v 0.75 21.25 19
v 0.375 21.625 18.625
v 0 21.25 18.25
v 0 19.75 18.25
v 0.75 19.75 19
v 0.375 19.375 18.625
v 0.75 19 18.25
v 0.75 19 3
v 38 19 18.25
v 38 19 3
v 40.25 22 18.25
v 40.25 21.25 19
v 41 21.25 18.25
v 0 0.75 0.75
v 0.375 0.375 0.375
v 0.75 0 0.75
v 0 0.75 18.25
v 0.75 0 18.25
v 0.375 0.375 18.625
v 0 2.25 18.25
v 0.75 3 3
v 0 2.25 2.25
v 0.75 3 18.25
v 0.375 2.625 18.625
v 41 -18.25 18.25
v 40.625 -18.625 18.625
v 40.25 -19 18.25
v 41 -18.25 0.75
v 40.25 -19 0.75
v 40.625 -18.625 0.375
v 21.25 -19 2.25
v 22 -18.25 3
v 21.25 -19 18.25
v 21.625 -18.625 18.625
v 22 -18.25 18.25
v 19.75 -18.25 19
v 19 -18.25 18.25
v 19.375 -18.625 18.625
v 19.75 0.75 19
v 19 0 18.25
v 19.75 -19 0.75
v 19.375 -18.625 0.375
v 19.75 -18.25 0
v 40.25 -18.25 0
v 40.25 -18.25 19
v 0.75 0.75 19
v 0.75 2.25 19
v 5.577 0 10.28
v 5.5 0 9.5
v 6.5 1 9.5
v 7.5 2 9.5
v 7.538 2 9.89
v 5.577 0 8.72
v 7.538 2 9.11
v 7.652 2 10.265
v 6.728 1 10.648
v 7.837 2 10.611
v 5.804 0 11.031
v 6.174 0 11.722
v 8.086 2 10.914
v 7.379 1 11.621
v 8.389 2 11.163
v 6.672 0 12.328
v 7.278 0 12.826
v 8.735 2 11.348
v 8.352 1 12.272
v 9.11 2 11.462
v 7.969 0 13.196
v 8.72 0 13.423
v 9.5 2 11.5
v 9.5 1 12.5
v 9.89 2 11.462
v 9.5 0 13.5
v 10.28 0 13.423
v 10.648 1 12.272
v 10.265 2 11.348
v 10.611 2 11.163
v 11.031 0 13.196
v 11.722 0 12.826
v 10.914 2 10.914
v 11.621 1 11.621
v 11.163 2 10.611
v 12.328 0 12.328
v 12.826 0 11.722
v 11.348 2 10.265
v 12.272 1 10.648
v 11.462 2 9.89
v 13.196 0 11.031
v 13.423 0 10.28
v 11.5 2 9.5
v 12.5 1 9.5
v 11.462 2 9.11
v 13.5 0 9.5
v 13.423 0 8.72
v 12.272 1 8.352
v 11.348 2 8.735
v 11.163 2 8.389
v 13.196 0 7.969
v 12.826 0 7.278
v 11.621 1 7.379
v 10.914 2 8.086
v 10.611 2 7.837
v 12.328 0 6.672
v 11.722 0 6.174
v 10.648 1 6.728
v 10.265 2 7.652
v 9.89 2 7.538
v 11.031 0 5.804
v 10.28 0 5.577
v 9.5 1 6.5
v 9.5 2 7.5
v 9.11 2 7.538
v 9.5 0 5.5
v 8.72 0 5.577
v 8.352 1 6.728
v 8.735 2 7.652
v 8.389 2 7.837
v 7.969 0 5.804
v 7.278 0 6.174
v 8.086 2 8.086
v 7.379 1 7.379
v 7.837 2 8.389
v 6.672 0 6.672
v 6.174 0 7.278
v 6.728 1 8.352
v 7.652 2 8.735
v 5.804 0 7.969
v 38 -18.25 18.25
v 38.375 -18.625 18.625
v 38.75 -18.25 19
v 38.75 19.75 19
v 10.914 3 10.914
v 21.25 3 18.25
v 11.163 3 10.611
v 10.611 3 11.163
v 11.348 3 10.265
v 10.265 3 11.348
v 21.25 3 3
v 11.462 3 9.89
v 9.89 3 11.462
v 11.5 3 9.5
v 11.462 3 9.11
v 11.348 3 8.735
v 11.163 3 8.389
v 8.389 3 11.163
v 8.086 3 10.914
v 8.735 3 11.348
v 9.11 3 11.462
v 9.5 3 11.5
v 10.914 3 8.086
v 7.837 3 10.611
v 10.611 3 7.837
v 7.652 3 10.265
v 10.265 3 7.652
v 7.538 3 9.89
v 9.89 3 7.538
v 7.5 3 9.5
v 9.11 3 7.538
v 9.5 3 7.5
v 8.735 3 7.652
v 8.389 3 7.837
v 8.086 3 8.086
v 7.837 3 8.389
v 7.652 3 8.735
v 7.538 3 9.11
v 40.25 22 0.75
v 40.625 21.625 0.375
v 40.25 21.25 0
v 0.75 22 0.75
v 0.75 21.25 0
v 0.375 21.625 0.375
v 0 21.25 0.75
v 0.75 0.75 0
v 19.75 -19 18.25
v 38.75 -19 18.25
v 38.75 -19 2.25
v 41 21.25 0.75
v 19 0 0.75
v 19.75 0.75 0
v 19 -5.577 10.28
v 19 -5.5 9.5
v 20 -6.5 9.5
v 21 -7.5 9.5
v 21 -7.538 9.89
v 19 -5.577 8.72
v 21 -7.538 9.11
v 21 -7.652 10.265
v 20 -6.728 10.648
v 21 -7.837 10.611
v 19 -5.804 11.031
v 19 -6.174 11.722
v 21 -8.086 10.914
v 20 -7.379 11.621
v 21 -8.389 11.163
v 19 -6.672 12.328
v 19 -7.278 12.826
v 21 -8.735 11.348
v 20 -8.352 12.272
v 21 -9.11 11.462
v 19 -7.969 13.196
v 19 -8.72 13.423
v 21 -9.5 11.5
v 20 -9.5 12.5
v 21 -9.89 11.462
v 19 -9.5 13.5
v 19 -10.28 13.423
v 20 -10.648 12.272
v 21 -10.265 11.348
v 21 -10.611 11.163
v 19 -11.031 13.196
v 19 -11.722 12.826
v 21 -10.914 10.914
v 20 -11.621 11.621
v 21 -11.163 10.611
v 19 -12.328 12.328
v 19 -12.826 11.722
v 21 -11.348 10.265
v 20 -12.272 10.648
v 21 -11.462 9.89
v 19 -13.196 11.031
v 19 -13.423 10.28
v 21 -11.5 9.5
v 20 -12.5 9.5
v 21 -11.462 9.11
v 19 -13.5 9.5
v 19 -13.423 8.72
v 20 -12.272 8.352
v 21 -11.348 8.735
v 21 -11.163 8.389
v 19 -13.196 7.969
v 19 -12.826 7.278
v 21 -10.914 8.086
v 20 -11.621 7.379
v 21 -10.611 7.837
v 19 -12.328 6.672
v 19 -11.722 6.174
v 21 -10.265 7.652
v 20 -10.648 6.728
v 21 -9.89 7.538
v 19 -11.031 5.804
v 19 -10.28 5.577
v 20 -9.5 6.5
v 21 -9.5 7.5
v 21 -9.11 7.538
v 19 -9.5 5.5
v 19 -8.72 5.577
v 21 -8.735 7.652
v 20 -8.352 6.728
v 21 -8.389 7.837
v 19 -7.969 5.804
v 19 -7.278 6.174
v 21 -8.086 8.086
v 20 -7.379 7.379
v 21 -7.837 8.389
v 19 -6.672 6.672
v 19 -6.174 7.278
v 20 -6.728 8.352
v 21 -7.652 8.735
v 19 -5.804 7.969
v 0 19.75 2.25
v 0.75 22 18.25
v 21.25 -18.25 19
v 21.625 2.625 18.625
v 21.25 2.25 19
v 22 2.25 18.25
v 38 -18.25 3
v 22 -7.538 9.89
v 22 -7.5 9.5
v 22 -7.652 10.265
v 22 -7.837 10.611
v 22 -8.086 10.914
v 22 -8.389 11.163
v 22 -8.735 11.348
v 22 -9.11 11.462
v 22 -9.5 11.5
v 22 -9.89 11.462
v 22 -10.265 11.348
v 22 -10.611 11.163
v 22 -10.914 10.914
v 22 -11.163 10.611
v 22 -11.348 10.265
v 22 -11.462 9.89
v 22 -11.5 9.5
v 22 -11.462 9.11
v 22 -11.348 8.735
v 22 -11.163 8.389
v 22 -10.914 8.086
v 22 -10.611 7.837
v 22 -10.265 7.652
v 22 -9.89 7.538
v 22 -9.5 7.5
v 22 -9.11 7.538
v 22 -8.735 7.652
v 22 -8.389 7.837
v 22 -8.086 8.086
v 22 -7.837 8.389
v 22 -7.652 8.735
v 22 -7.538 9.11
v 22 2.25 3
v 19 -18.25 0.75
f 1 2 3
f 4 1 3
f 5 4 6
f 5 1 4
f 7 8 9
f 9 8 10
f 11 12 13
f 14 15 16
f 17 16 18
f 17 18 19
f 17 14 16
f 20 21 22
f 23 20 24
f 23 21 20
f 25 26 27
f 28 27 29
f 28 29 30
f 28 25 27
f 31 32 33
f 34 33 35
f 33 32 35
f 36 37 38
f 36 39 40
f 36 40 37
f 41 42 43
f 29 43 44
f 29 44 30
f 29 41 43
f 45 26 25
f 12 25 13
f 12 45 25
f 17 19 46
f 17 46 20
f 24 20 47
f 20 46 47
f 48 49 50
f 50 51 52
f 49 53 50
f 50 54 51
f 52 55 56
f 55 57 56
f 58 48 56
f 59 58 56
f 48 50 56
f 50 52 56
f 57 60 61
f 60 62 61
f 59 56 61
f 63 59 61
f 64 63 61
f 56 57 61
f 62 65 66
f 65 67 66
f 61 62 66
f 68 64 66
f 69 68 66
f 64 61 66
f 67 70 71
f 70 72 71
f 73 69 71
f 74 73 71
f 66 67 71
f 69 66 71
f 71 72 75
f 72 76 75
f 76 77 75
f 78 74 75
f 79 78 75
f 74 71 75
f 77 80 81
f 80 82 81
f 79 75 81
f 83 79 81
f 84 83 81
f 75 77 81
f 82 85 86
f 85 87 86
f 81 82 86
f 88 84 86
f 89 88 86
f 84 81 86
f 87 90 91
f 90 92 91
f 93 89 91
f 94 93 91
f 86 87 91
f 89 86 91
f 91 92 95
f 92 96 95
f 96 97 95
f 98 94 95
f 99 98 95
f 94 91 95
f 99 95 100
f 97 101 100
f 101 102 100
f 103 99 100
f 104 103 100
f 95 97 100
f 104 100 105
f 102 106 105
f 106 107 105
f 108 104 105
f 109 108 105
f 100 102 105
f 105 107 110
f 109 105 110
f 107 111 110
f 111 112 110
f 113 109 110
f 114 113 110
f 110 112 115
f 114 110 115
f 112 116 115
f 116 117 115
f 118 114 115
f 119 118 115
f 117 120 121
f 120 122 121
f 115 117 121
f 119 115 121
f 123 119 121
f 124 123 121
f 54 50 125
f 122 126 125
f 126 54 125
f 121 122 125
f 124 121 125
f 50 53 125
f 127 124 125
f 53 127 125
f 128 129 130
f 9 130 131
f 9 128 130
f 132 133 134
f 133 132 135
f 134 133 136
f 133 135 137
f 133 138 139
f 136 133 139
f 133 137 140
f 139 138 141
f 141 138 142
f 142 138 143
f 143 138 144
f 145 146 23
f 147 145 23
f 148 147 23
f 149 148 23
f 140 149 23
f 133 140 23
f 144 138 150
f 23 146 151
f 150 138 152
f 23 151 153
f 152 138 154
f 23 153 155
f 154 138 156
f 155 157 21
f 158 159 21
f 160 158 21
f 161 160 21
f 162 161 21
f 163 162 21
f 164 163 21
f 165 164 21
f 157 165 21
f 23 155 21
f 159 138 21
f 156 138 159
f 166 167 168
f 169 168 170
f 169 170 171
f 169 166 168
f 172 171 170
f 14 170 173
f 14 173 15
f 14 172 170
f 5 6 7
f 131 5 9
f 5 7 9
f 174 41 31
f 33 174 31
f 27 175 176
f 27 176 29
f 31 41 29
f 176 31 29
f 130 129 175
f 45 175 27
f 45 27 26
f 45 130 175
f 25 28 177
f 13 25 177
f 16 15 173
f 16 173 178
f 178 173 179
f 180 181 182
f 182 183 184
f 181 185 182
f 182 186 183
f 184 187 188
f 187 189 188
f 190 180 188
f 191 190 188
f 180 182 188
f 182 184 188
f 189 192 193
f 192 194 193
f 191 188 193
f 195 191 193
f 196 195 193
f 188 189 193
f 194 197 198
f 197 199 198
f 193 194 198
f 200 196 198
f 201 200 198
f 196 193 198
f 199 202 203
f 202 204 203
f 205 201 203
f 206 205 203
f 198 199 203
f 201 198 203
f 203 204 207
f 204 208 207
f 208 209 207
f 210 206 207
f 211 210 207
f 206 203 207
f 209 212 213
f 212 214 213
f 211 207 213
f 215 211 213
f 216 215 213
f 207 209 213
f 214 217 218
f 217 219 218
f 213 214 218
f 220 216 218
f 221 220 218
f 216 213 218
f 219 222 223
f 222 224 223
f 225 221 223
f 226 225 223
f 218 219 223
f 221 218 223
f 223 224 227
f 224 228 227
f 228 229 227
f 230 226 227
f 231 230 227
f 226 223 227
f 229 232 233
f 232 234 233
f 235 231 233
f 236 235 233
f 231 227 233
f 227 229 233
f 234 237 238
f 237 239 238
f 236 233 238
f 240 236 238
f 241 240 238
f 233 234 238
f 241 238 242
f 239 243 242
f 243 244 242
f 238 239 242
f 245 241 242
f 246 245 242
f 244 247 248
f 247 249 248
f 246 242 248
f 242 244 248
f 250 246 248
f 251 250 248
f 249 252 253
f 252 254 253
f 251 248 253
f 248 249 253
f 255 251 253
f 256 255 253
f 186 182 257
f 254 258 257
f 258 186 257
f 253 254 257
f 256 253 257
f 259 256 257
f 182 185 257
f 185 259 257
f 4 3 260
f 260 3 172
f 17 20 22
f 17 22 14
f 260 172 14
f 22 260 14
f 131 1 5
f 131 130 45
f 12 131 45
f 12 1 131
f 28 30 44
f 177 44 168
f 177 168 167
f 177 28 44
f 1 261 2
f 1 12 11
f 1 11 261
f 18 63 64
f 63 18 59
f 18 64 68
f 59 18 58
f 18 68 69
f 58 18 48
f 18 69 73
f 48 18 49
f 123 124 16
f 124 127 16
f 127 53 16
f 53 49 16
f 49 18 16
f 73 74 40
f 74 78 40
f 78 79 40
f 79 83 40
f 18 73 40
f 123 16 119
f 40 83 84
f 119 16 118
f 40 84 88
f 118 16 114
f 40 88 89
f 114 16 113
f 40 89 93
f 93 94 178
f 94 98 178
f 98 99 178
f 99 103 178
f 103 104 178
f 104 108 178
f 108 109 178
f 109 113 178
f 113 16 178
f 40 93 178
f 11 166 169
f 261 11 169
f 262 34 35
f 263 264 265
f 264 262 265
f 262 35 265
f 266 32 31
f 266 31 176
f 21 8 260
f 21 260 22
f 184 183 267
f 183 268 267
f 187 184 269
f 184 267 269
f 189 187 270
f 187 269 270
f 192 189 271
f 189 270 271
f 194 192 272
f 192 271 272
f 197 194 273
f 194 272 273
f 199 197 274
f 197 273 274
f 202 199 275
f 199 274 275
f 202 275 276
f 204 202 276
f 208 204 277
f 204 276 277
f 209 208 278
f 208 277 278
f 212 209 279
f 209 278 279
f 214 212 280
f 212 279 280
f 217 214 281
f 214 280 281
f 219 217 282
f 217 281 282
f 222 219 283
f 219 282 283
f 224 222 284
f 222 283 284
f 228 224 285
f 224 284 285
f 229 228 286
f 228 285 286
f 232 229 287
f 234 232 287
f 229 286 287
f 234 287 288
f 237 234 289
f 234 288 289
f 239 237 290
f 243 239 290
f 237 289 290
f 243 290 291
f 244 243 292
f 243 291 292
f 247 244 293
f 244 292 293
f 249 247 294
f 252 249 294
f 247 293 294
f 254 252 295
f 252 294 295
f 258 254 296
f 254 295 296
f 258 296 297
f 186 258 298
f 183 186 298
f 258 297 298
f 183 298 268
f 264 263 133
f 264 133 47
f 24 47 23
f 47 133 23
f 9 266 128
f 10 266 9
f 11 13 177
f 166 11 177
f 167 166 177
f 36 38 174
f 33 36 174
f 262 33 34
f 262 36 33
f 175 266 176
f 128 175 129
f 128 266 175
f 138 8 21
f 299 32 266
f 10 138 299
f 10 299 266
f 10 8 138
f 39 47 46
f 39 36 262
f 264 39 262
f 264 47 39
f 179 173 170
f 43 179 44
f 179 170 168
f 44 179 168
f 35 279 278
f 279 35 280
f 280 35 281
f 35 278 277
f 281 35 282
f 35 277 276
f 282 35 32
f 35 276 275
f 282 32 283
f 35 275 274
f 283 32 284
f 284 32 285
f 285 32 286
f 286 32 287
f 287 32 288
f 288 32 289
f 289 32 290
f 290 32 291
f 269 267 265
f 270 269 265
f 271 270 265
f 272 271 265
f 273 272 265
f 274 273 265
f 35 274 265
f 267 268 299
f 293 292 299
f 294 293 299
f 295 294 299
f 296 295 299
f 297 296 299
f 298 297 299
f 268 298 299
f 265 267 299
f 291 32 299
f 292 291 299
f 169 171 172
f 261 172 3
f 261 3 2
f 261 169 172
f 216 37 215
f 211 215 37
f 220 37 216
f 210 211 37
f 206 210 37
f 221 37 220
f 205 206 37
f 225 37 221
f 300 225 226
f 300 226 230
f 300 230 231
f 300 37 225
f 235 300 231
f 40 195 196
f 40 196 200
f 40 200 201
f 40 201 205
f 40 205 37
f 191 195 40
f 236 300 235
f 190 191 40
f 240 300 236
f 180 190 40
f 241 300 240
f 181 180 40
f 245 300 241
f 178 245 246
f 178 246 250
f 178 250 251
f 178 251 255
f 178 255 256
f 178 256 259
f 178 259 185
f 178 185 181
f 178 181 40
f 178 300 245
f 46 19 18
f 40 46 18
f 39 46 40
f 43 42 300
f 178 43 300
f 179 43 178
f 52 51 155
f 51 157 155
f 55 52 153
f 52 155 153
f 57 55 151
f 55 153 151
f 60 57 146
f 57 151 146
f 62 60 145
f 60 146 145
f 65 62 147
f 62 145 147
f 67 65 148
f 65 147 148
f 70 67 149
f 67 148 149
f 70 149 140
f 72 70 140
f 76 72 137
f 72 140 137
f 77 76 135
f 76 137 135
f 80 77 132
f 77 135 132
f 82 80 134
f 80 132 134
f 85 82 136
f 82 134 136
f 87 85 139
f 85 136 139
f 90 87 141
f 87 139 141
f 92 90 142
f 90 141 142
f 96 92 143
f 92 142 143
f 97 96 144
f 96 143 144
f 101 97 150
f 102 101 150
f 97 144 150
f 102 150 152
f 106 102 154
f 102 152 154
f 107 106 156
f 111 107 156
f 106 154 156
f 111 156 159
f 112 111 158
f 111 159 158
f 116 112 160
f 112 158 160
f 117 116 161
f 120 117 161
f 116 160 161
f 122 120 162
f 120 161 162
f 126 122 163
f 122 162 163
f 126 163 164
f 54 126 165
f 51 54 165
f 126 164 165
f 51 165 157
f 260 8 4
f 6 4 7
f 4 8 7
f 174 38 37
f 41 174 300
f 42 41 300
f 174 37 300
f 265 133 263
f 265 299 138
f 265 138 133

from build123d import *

# Parameters (mm, degrees)
F0_W           = 22
F0_H           = 19
F1_DEPTH       = 3
F2_W           = 3
F2_H           = 38
F2_W_2         = 19
F2_H_2         = 3
F3_DEPTH       = 16
F5_D           = 4
F5_DEPTH       = 12
F5_CSINK_D     = 8
F5_CSINK_ANGLE = 90
F5_TIP         = 1.2017212381
F7_D           = 4
F7_DEPTH       = 12
F7_CSINK_D     = 8
F7_CSINK_ANGLE = 90
F7_TIP         = 1.2017212381
F8_SIZE        = 0.75
F9_SIZE        = 0.75
F10_SIZE       = 0.75
F11_SIZE       = 0.75
F12_SIZE       = 0.75


with BuildPart() as f1:
    # F0 (on Top) → F1 (new body)
    with BuildSketch(Plane.XY):
        Polygon((0, 22), (0, 0), (19, 0), (41, 0), (41, 22), align=None)
        with Locations((30, -9.5)):
            Rectangle(F0_W, F0_H)
    extrude(amount=F1_DEPTH)

    # F2 (on face) → F3 (join)
    with BuildSketch(Plane.XY.offset(3)):
        Polygon((41, 22), (0, 22), (0, 19), (38, 19), (41, 19), align=None)
        with Locations((39.5, 0)):
            Rectangle(F2_W, F2_H)
        Polygon((22, 3), (19, 3), (19, 0), (19, -19), (22, -19), align=None)
        with Locations((9.5, 1.5)):
            Rectangle(F2_W_2, F2_H_2)
    extrude(amount=F3_DEPTH)

    # F5
    with Locations(Plane.XZ):
        with Locations((9.5, 9.5)):
            CounterSinkHole(F5_D / 2, F5_CSINK_D / 2, depth=F5_DEPTH, counter_sink_angle=F5_CSINK_ANGLE)
            with Locations((0, 0, -(F5_DEPTH + F5_TIP / 2))):  # 118° drill point
                Cone(0, F5_D / 2, F5_TIP, mode=Mode.SUBTRACT)

    # F7
    with Locations(Plane(origin=(19, 0, 0), x_dir=(0, -1, 0), z_dir=(-1, 0, 0))):
        with Locations((9.5, 9.5)):
            CounterSinkHole(F7_D / 2, F7_CSINK_D / 2, depth=F7_DEPTH, counter_sink_angle=F7_CSINK_ANGLE)
            with Locations((0, 0, -(F7_DEPTH + F7_TIP / 2))):  # 118° drill point
                Cone(0, F7_D / 2, F7_TIP, mode=Mode.SUBTRACT)

    # F8
    f8_edges = [f1.edges().sort_by_distance(p)[0] for p in [
        (19, -19, 9.5),
        (20.5, -19, 19),
        (22, -19, 11),
        (30, -19, 3),
        (38, -19, 11),
        (39.5, -19, 19),
        (41, -19, 9.5),
        (30, -19, 0),
    ]]
    chamfer(f8_edges, length=F8_SIZE)

    # F9
    f9_edges = [f1.edges().sort_by_distance(p)[0] for p in [
        (0, 22, 9.5),
        (0, 20.5, 19),
        (0, 19, 11),
        (0, 11, 3),
        (0, 3, 11),
        (0, 1.5, 19),
        (0, 0, 9.5),
        (0, 11, 0),
    ]]
    chamfer(f9_edges, length=F9_SIZE)

    # F10
    f10_edges = [f1.edges().sort_by_distance(p)[0] for p in [
        (19, -9.125, 19),
        (9.875, 0, 19),
        (11.375, 3, 19),
        (22, -7.625, 19),
        (38, 0.375, 19),
        (19.375, 19, 19),
        (20.875, 22, 19),
        (41, 1.875, 19),
        (41, 22, 9.5),
    ]]
    chamfer(f10_edges, length=F10_SIZE)

    # F11
    f11_edges = [f1.edges().sort_by_distance(p)[0] for p in [
        (22, 3, 10.625),
    ]]
    chamfer(f11_edges, length=F11_SIZE)

    # F12 (call 1 of 3: OpenCascade refuses the feature's edges together)
    f12_edges = [f1.edges().sort_by_distance(p)[0] for p in [
        (19, -9.125, 0),
        (9.875, 0, 0),
    ]]
    chamfer(f12_edges, length=F12_SIZE)

    # F12#2 (call 2 of 3)
    f12_2_edges = [f1.edges().sort_by_distance(p)[0] for p in [
        (41, 1.5, 0),
    ]]
    chamfer(f12_2_edges, length=F12_SIZE)

    # F12#3 (call 3 of 3)
    f12_3_edges = [f1.edges().sort_by_distance(p)[0] for p in [
        (20.5, 22, 0),
    ]]
    chamfer(f12_3_edges, length=F12_SIZE)


solid = f1.part
